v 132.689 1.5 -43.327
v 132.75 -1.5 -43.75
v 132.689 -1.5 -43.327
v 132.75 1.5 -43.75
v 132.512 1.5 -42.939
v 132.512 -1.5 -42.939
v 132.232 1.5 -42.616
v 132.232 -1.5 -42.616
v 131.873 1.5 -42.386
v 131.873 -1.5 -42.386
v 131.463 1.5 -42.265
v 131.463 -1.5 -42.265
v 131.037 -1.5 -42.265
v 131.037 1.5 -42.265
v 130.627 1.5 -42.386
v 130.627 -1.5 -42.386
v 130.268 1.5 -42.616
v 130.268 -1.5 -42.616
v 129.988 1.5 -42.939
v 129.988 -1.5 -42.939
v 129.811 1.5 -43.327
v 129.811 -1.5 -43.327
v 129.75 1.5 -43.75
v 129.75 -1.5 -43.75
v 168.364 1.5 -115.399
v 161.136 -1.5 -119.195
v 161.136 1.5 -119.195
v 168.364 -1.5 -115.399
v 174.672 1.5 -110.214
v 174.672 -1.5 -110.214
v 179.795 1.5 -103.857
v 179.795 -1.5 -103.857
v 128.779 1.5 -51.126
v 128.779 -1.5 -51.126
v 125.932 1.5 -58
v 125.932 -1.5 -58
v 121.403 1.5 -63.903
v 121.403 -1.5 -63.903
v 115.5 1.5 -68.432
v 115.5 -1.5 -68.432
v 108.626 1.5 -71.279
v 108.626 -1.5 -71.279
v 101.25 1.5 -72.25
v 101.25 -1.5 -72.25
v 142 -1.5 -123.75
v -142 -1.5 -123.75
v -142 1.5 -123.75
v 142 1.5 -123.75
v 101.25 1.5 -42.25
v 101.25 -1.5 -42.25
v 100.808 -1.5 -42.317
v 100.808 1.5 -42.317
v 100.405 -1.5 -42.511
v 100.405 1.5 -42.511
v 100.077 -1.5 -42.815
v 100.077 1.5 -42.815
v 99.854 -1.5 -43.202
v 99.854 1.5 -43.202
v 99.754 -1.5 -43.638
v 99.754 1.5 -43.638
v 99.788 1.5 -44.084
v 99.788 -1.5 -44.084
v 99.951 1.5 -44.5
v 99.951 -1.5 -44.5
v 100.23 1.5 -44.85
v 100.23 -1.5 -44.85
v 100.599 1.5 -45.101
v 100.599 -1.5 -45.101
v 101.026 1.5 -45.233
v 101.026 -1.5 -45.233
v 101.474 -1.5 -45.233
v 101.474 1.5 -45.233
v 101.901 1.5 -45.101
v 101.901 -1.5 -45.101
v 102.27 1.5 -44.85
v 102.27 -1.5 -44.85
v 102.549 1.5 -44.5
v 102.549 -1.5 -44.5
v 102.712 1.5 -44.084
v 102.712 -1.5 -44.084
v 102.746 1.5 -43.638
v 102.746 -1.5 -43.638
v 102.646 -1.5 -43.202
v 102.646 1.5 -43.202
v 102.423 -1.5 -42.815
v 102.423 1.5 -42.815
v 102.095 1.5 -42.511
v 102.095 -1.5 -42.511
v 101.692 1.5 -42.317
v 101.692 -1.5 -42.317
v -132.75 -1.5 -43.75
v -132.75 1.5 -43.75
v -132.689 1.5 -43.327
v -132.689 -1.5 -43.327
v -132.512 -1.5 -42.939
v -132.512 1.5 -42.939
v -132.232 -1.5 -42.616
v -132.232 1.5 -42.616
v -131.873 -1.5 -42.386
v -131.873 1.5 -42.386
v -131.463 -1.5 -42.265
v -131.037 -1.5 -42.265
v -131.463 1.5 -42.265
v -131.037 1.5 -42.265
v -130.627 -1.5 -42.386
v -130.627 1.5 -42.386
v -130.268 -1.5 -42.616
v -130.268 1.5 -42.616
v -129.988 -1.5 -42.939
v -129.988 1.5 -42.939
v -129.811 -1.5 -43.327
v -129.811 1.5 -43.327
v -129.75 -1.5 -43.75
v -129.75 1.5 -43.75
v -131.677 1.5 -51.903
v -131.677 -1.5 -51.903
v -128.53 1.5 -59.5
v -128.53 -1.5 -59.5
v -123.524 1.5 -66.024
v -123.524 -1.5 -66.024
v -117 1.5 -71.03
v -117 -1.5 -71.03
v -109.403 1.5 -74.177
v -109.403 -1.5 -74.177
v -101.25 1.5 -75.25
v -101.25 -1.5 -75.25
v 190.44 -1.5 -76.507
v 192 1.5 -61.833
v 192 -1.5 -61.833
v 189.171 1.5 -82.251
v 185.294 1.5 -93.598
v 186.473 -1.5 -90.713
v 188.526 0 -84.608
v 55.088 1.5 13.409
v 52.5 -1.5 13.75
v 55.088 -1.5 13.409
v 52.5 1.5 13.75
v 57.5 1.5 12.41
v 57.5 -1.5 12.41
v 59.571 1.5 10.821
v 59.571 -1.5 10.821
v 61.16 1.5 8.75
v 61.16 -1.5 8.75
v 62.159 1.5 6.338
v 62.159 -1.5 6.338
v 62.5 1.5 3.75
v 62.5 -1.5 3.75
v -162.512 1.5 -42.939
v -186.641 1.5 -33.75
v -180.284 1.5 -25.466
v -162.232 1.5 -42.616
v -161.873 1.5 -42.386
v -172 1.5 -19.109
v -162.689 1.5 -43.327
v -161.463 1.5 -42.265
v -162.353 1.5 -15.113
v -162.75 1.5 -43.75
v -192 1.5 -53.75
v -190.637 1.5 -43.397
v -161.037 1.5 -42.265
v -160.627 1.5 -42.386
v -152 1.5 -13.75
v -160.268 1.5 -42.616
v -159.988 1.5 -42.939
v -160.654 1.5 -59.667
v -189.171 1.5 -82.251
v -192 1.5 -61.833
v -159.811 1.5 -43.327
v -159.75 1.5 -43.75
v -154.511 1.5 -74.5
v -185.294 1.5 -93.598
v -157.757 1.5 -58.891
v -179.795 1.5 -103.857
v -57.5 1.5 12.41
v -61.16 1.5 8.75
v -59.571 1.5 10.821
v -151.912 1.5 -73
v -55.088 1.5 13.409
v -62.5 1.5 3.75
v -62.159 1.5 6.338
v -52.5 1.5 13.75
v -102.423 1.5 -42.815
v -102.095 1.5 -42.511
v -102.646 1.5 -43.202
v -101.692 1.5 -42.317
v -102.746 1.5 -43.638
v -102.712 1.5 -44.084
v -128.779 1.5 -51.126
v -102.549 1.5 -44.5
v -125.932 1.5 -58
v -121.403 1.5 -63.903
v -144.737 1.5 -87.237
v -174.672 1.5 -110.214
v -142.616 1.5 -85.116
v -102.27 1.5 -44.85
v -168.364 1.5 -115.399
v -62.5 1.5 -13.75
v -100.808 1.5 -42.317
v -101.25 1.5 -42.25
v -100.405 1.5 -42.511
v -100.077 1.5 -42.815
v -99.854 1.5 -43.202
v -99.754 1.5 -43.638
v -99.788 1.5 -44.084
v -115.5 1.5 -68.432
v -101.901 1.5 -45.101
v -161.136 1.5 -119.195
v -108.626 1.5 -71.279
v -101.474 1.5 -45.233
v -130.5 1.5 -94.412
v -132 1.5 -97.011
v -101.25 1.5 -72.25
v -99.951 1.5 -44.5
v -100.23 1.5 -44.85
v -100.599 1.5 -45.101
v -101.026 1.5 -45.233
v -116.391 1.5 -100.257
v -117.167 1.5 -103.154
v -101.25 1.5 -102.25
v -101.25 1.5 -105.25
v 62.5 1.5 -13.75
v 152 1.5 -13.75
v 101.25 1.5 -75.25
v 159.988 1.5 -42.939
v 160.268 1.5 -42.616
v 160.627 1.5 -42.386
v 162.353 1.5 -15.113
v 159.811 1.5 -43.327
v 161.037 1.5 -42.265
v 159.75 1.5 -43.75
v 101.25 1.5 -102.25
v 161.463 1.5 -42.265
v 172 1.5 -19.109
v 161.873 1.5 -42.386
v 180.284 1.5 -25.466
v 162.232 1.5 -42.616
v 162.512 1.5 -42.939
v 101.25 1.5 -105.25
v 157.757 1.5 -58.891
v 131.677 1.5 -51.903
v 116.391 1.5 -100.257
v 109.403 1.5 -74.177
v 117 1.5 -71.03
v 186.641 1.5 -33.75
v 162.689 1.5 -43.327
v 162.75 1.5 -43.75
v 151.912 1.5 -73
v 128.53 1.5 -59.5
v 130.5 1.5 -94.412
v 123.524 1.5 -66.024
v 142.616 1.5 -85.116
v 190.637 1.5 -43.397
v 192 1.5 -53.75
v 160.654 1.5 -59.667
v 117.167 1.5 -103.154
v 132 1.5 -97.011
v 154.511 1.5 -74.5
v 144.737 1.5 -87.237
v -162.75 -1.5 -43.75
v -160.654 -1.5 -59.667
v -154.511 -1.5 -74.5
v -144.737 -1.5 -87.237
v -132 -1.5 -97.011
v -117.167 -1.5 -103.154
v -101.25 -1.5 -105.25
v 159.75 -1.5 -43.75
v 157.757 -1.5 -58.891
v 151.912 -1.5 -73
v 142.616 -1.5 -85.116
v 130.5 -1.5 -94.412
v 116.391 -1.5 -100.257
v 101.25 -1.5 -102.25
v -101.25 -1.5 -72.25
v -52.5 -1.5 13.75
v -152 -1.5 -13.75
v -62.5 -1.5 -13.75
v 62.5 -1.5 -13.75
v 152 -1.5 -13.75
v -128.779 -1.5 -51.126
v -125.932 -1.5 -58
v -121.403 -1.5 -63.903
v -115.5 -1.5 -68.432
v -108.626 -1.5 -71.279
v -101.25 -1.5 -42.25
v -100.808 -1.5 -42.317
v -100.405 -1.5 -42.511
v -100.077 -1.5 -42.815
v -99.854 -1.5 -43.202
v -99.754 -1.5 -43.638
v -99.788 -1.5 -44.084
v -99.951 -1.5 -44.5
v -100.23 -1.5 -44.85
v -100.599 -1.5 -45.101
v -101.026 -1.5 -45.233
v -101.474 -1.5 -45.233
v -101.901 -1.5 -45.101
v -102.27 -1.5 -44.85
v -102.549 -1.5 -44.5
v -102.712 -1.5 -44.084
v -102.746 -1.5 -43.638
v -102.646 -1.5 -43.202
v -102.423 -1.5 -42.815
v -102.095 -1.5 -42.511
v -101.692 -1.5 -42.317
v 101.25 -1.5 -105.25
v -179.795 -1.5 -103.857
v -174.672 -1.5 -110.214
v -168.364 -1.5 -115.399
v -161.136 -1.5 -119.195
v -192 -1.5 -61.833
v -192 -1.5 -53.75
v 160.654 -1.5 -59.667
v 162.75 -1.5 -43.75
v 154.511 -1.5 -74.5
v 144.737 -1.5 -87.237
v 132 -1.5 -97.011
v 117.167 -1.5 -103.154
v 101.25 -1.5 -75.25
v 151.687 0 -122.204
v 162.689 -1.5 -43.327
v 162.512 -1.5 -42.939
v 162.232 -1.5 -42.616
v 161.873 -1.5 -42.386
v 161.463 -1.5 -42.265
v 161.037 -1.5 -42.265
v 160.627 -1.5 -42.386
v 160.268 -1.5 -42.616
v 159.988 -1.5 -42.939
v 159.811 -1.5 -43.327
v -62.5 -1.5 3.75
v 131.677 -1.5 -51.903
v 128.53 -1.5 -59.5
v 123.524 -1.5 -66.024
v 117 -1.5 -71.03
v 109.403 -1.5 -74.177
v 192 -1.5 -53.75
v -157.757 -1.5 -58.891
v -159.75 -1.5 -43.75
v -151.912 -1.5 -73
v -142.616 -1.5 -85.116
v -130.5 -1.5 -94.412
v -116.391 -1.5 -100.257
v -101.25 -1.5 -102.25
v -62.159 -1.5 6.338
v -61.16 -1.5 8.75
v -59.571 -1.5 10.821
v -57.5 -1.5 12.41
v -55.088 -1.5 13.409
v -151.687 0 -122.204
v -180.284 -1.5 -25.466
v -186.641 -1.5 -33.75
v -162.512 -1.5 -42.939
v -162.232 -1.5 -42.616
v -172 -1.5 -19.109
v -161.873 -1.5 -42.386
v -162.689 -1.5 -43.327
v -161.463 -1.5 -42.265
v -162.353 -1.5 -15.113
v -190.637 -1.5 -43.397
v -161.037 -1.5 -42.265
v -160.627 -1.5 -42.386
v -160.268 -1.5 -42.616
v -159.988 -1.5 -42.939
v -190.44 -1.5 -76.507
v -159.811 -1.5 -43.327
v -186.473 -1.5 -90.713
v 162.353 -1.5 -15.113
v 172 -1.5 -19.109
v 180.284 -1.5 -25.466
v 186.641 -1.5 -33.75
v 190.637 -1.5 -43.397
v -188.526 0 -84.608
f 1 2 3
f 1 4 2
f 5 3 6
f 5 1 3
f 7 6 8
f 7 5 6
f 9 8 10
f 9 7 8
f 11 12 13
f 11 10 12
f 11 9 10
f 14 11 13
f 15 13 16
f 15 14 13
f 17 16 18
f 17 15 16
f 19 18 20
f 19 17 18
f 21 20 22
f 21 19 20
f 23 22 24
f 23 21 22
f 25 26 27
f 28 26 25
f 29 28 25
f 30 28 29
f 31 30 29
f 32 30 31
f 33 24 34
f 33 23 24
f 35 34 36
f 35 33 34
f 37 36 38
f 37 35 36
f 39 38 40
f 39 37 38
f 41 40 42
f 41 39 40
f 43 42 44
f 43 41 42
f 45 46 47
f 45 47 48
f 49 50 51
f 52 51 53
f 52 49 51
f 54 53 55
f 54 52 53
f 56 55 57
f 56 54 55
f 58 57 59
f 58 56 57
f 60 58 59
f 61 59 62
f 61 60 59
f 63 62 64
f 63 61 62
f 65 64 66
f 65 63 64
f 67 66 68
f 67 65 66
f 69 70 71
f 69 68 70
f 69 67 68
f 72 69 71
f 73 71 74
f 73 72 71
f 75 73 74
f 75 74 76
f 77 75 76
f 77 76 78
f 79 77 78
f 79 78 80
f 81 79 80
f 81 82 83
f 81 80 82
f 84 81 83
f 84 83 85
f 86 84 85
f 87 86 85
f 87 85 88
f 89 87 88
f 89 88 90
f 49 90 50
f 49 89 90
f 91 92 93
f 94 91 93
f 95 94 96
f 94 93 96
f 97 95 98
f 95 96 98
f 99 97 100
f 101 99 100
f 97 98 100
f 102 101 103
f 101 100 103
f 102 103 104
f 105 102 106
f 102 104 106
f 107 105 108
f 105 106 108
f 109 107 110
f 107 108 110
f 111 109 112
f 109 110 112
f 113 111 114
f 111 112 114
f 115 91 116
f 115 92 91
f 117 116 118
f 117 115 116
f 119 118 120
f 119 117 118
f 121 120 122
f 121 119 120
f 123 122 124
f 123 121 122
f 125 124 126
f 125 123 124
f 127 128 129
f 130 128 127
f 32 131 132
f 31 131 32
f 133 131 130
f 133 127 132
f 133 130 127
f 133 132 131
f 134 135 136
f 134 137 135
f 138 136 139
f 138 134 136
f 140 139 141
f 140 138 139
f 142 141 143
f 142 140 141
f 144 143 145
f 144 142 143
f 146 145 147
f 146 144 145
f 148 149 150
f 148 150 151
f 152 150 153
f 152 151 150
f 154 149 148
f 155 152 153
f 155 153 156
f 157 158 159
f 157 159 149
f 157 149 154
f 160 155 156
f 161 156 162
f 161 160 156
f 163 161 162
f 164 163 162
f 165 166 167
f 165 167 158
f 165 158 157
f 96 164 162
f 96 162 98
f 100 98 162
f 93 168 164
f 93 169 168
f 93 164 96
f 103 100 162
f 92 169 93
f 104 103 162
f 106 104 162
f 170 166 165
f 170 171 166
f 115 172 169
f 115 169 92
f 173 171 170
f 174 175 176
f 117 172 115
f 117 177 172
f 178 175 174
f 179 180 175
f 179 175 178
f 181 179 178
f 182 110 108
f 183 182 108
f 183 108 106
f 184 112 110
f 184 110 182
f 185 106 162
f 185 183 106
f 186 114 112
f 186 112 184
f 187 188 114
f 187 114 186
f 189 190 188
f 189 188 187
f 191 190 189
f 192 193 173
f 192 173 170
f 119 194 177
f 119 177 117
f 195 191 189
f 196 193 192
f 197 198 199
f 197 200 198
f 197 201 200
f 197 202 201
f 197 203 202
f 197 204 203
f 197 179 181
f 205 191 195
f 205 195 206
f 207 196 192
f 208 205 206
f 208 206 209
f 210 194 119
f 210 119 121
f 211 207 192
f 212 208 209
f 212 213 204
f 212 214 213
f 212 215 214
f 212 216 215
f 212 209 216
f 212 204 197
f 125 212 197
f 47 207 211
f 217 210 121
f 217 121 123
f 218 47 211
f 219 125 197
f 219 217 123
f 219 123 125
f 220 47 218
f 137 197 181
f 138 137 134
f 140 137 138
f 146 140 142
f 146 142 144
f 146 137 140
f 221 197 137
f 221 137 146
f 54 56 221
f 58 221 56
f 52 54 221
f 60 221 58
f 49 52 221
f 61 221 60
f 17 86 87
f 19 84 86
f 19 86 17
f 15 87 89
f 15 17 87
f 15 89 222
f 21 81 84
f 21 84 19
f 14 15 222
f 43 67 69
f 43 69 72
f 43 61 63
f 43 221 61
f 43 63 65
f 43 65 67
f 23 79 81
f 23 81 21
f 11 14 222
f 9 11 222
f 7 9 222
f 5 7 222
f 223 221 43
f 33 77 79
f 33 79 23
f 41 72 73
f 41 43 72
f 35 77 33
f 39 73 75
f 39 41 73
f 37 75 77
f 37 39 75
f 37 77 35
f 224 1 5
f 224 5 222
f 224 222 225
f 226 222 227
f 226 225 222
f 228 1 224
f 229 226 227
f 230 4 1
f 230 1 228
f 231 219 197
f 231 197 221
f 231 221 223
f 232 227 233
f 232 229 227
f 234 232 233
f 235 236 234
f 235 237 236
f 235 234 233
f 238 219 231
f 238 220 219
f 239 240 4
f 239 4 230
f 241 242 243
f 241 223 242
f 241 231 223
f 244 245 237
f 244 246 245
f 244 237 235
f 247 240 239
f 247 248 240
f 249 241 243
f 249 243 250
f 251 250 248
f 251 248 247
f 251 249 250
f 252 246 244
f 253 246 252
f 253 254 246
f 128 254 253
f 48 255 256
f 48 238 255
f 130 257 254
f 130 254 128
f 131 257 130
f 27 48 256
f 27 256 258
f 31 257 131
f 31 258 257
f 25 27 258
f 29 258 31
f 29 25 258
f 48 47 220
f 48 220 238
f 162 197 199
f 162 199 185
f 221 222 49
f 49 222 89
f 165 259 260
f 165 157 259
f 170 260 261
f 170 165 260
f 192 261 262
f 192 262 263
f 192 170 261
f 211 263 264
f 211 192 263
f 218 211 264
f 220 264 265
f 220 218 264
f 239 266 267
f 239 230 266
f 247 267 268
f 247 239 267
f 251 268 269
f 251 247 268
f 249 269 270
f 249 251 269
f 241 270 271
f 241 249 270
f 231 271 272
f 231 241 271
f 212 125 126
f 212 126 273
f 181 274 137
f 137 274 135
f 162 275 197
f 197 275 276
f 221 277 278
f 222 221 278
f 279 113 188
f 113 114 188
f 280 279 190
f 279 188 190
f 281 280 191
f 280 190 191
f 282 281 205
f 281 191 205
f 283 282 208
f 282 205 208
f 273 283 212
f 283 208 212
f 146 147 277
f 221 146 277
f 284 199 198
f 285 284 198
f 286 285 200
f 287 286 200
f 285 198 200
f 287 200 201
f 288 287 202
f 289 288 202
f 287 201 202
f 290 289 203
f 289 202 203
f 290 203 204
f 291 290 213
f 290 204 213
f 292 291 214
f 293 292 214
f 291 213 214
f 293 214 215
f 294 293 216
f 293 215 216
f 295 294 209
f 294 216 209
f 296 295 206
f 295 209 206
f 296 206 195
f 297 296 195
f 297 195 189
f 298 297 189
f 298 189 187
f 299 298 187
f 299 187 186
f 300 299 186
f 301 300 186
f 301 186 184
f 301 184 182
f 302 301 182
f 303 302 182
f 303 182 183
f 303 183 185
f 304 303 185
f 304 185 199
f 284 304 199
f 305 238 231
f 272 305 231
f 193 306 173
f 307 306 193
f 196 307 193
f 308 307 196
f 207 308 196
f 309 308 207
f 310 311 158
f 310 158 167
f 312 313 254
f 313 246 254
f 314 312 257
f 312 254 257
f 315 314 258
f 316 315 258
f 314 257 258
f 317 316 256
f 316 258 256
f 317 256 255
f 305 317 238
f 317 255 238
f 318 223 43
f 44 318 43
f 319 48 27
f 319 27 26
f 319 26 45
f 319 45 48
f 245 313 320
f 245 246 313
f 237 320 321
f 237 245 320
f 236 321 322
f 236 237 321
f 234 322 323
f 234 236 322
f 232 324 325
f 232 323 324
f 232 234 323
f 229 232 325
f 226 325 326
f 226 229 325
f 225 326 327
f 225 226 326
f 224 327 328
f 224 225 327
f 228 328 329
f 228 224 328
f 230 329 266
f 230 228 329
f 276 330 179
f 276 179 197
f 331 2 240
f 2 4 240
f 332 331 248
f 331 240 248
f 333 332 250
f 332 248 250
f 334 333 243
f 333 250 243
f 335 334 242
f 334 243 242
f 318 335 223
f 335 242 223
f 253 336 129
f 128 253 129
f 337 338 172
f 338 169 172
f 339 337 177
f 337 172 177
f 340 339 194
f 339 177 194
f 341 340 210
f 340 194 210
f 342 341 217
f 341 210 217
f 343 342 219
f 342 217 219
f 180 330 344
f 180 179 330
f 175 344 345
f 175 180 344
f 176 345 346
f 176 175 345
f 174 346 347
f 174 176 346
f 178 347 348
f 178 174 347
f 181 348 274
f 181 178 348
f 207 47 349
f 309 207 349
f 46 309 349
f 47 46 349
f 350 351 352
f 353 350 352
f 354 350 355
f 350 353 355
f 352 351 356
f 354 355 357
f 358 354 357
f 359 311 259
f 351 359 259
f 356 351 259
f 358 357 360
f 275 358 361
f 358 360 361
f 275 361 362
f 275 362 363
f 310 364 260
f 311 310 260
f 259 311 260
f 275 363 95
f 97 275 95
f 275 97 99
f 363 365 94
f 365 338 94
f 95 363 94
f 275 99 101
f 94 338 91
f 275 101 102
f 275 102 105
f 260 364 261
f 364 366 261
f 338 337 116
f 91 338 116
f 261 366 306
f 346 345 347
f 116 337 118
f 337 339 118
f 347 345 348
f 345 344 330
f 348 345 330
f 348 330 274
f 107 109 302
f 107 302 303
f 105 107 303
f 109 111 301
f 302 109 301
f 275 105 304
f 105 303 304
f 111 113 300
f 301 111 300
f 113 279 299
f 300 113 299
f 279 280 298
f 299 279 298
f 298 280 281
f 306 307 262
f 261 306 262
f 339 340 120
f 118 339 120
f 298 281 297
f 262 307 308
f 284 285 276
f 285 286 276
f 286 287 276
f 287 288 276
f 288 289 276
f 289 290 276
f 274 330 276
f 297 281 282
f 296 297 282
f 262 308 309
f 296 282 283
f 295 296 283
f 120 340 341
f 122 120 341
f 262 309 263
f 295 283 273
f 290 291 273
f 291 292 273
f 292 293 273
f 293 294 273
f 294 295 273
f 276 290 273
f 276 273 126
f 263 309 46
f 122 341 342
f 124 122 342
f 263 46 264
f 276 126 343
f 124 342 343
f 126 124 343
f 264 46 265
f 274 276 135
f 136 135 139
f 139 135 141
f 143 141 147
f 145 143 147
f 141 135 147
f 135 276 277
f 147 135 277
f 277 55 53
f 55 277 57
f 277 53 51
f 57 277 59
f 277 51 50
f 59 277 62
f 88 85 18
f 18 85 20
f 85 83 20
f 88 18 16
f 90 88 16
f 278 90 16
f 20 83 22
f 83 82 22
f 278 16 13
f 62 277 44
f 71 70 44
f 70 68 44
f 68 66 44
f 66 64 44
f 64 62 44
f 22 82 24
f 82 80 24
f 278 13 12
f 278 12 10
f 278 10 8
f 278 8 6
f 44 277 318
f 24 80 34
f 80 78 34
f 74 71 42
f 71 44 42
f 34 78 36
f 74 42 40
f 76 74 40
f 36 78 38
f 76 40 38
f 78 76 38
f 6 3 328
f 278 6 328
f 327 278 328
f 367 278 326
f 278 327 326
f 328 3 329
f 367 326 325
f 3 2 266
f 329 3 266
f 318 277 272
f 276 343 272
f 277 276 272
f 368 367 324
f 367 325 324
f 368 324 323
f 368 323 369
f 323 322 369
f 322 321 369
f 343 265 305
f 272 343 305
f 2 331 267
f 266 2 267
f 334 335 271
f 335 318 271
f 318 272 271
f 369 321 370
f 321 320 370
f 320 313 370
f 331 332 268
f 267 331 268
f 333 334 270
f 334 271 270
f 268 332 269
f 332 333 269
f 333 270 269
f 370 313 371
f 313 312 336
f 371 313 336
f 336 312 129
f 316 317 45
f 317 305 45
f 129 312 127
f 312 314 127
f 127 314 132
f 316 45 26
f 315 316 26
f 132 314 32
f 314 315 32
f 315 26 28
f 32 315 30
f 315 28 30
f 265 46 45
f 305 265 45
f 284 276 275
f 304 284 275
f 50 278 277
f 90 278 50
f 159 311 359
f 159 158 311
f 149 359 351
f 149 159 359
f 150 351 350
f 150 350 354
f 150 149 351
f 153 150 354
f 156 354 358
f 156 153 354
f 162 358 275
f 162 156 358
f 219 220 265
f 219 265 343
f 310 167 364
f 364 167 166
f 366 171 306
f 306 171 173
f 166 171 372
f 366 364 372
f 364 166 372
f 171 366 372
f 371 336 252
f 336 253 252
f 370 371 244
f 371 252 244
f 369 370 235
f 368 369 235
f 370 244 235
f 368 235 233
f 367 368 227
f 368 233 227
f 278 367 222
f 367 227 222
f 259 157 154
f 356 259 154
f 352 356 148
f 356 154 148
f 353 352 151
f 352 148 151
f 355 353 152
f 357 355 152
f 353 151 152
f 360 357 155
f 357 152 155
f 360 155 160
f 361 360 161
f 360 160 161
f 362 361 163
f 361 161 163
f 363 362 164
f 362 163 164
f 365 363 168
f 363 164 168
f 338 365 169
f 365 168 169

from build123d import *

# Parameters (mm, degrees)
BOSS_EXTRUDE1_DEPTH      = 1.5
BOSS_EXTRUDE1_DEPTH_BACK = 1.5
SKETCH1_W                = 125
SKETCH1_H                = 27.5
FILLET1_R                = 10
FILLET2_R                = 10
BOSS_EXTRUDE2_DEPTH      = 1.5
BOSS_EXTRUDE2_DEPTH_BACK = 1.5
SKETCH3_W                = 384
SKETCH3_H                = 110
FILLET3_R                = 40
FILLET4_R                = 40
CUT_EXTRUDE1_DEPTH       = 229.444878472
FILLET5_R                = 40
FILLET5_OF_MIRROR1_R     = 40
SKETCH5_R                = 1.5
CUT_EXTRUDE2_DEPTH       = 229.444878611
SKETCH8_W                = 3
SKETCH8_H                = 3
CUT_REVOLVE1_ANGLE       = 90


with BuildPart() as part:
    # Sketch1 → Boss-Extrude1 (new, two sides: drawn at the far end of the back side and taken through both)
    with BuildSketch(Plane(origin=(0, 0, 0), x_dir=(1, 0, 0), z_dir=(0, 1, 0)).offset(-BOSS_EXTRUDE1_DEPTH_BACK)):
        Rectangle(SKETCH1_W, SKETCH1_H)
    extrude(amount=BOSS_EXTRUDE1_DEPTH + BOSS_EXTRUDE1_DEPTH_BACK)

    # Fillet1
    fillet1_edges = [part.edges().sort_by_distance(p)[0] for p in [
        (-62.5, 0, 13.75),
    ]]
    fillet(fillet1_edges, radius=FILLET1_R)

    # Fillet2
    fillet2_edges = [part.edges().sort_by_distance(p)[0] for p in [
        (62.5, 0, 13.75),
    ]]
    fillet(fillet2_edges, radius=FILLET2_R)

    # Sketch3 → Boss-Extrude2 (add, two sides: drawn at the far end of the back side and taken through both)
    with BuildSketch(Plane(origin=(0, 0, 0), x_dir=(1, 0, 0), z_dir=(0, 1, 0)).offset(-BOSS_EXTRUDE2_DEPTH_BACK)):
        with Locations((0, 68.75)):
            Rectangle(SKETCH3_W, SKETCH3_H)
    extrude(amount=BOSS_EXTRUDE2_DEPTH + BOSS_EXTRUDE2_DEPTH_BACK)

    # Fillet3
    fillet3_edges = [part.edges().sort_by_distance(p)[0] for p in [
        (192, 0, -13.75),
    ]]
    fillet(fillet3_edges, radius=FILLET3_R)

    # Fillet4
    fillet4_edges = [part.edges().sort_by_distance(p)[0] for p in [
        (-192, 0, -13.75),
    ]]
    fillet(fillet4_edges, radius=FILLET4_R)

    # Sketch4 → Cut-Extrude1 (cut, through all)
    with BuildSketch(Plane(origin=(0, 1.5, 0), x_dir=(1, 0, 0), z_dir=(0, 1, 0))):
        with BuildLine():
            Line((-160.390648589, 123.75), (-192, 123.75))
            Line((-192, 123.75), (-192, 61.83266327))
            add(Edge.make_bspline(
                [(-192, 61.83266327), (-190.899009452, 93.759296174), (-172, 113.75)],
                knots=[0.088627388, 0.088627388, 0.088627388, 0.804978643, 0.804978643, 0.804978643], degree=2))
            add(Edge.make_bspline(
                [(-172, 113.75), (-166.85488377, 119.192321989), (-160.390648589, 123.75)],
                knots=[0.804978643, 0.804978643, 0.804978643, 1, 1, 1], degree=2))
        make_face()
        with BuildLine():
            Line((-142, 123.75), (-160.390648589, 123.75))
            add(Edge.make_bspline(
                [(-172, 113.75), (-166.85488377, 119.192321989), (-160.390648589, 123.75)],
                knots=[0.804978643, 0.804978643, 0.804978643, 1, 1, 1], degree=2))
            add(Edge.make_bspline(
                [(-172, 113.75), (-157.601214668, 122.454851717), (-142, 123.75)],
                knots=[0, 0, 0, 0.740970343, 0.740970343, 0.740970343], degree=2))
        make_face()
    cut_extrude1 = extrude(amount=-CUT_EXTRUDE1_DEPTH, mode=Mode.SUBTRACT)

    # Fillet5
    fillet5_edges = [part.edges().sort_by_distance(p)[0] for p in [
        (-172, 0, -113.75),
    ]]
    fillet(fillet5_edges, radius=FILLET5_R)

    # Mirror1: Cut-Extrude1 across plane
    add(cut_extrude1.mirror(Plane(origin=(0, 0, 0), x_dir=(0, 0, 1), z_dir=(1, 0, 0))), mode=Mode.SUBTRACT)

    # Fillet5 of Mirror1
    fillet5_of_mirror1_edges = [part.edges().sort_by_distance(p)[0] for p in [
        (172, 0, -113.75),
    ]]
    fillet(fillet5_of_mirror1_edges, radius=FILLET5_OF_MIRROR1_R)

    # Sketch5 → Cut-Extrude2 (cut, through all)
    with BuildSketch(Plane(origin=(0, 1.5, 0), x_dir=(1, 0, 0), z_dir=(0, 1, 0))):
        with Locations(Location((-101.25, 43.75, 0), (0, 0, 270))):
            Circle(SKETCH5_R)
        with Locations(Location((-131.25, 43.75, 0), (0, 0, 270))):
            Circle(SKETCH5_R)
        with Locations(Location((-161.25, 43.75, 0), (0, 0, 270))):
            Circle(SKETCH5_R)
    cut_extrude2 = extrude(amount=-CUT_EXTRUDE2_DEPTH, mode=Mode.SUBTRACT)

    # Sketch8 → Cut-Revolve1 (revolve, cut)
    with BuildSketch(Plane.XY.offset(-43.75)):
        with Locations((-131.25, 0)):
            Rectangle(SKETCH8_W, SKETCH8_H)
        with Locations((-161.25, 0)):
            Rectangle(SKETCH8_W, SKETCH8_H)
    cut_revolve1 = revolve(axis=Axis((-101.25, -1.5, -43.75), (0, -1, 0)), revolution_arc=CUT_REVOLVE1_ANGLE, mode=Mode.SUBTRACT)

    # Mirror2: Cut-Extrude2, Cut-Revolve1 across plane
    add(cut_extrude2.mirror(Plane(origin=(0, 0, 0), x_dir=(0, 0, 1), z_dir=(1, 0, 0))), mode=Mode.SUBTRACT)
    add(cut_revolve1.mirror(Plane(origin=(0, 0, 0), x_dir=(0, 0, 1), z_dir=(1, 0, 0))), mode=Mode.SUBTRACT)


solid = part.part
